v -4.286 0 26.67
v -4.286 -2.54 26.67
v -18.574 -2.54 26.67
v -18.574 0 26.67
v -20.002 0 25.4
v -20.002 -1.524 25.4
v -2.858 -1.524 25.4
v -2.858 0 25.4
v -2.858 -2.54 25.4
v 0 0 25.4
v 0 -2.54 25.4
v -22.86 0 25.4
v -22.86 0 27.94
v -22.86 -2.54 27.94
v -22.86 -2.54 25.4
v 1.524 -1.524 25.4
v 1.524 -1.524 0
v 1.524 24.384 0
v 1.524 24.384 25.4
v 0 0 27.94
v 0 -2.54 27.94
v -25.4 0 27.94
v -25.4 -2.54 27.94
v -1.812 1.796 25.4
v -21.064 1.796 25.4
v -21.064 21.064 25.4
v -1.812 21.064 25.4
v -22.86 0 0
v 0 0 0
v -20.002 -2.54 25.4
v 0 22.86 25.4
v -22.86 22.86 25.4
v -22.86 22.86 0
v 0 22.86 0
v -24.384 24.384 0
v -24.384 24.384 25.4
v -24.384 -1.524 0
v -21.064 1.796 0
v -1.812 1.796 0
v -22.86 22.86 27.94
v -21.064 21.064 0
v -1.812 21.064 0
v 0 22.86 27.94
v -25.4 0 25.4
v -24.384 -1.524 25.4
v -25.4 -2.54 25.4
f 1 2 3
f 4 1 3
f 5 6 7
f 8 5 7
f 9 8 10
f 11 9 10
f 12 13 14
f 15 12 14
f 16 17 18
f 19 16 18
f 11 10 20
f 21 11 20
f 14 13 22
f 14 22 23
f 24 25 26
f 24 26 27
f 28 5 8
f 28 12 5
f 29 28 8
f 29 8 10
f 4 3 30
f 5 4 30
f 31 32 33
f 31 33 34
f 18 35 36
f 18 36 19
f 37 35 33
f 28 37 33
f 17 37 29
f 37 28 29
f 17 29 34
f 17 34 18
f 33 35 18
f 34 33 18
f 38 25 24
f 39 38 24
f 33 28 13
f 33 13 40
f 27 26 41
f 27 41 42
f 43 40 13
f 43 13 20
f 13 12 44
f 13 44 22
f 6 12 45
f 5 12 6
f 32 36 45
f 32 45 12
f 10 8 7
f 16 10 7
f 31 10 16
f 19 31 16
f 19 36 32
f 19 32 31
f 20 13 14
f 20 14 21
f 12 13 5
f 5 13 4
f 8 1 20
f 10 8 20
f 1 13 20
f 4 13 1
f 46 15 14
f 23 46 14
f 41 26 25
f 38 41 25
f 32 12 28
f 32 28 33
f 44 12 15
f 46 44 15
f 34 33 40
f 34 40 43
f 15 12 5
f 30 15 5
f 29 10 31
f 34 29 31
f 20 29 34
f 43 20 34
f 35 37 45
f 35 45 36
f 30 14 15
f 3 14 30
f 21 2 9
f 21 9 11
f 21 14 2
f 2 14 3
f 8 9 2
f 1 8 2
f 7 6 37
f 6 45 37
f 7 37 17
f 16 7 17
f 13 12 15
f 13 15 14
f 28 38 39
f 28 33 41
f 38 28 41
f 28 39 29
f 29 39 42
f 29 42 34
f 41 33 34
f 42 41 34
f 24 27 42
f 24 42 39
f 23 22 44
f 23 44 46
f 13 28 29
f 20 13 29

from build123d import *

# Parameters (mm, degrees)
F0_W      = 25.908
F0_H      = 25.908
F0_W_2    = 22.86
F0_H_2    = 22.86
F1_DEPTH  = 25.4
F2_DEPTH  = 27.94
F3_W      = 22.86
F3_H      = 2.5400505984
F4_DEPTH  = 2.54
F5_W      = 2.54
F5_H      = 2.5400505984
F6_DEPTH  = 2.54
F8_DEPTH  = 2.54
F9_W      = 19.251639167
F9_H      = 19.2678975516
F10_DEPTH = 25.4


with BuildPart() as f1:
    # F0 (on Top) → F1 (new body)
    with BuildSketch(Plane.XY):
        with Locations((-11.43, 11.43)):
            Rectangle(F0_W, F0_H)
        with Locations((-11.43, 11.43)):
            Rectangle(F0_W_2, F0_H_2, mode=Mode.SUBTRACT)
    extrude(amount=F1_DEPTH)


with BuildPart() as f2:
    # F0 (on Top) → F2 (new body)
    with BuildSketch(Plane.XY):
        with Locations((-11.43, 11.43)):
            Rectangle(F0_W_2, F0_H_2)
    extrude(amount=F2_DEPTH)

    # F9 (on face) → F10 (cut)
    with BuildSketch(Plane(origin=(0, 0, 0), x_dir=(1, 0, 0), z_dir=(0, 0, -1))):
        with Locations((-11.4381291923, -11.43)):
            Rectangle(F9_W, F9_H)
    extrude(amount=-F10_DEPTH, mode=Mode.SUBTRACT)


with BuildPart() as f4:
    # F3 (on face) → F4 (new body)
    with BuildSketch(Plane.XZ):
        with Locations((-11.43, 26.6699747008)):
            Rectangle(F3_W, F3_H)
    extrude(amount=F4_DEPTH)


with BuildPart() as f6:
    # F5 (on face) → F6 (new body)
    with BuildSketch(Plane(origin=(-22.86, 0, 0), x_dir=(0, -1, 0), z_dir=(-1, 0, 0))):
        with Locations((1.27, 26.6699747008)):
            Rectangle(F5_W, F5_H)
    extrude(amount=F6_DEPTH)


with BuildPart() as f8_tool:
    # F7 (on face) → F8 (new body)
    with BuildSketch(Plane.XZ.offset(2.54)):
        Polygon((-4.28625, 26.6699747008), (-18.57375, 26.6699747008), (-20.0025, 25.3999494016), (-2.8575, 25.3999494016), align=None)
    extrude(amount=-F8_DEPTH)


with BuildPart() as f1_1:
    add(f1.part)

    # F8: cut by f8_tool
    add(f8_tool.part, mode=Mode.SUBTRACT)


with BuildPart() as f4_1:
    add(f4.part)

    # F8: cut by f8_tool
    add(f8_tool.part, mode=Mode.SUBTRACT)


solid = Compound([f2.part, f6.part, f1_1.part, f4_1.part])
